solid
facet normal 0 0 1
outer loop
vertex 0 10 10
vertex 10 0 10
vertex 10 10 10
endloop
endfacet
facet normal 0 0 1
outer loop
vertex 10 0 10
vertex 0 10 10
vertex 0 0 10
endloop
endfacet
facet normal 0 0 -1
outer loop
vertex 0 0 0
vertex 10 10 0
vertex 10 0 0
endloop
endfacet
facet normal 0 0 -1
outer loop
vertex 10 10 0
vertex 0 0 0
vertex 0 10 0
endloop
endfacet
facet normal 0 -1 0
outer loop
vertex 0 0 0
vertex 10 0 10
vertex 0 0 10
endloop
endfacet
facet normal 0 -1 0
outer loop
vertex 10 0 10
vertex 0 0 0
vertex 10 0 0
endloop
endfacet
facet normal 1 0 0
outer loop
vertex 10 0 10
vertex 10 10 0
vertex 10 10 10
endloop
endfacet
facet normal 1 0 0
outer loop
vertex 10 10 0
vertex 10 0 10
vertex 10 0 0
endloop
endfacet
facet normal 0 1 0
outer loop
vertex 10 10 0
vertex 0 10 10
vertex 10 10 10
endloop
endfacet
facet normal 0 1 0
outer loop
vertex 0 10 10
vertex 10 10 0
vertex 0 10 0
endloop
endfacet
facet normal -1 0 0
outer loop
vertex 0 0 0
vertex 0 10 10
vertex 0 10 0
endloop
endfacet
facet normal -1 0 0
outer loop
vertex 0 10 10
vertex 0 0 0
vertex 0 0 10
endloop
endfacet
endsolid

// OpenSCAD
// Construct: cube() with a scalar size (uniform box).
cube(10);
